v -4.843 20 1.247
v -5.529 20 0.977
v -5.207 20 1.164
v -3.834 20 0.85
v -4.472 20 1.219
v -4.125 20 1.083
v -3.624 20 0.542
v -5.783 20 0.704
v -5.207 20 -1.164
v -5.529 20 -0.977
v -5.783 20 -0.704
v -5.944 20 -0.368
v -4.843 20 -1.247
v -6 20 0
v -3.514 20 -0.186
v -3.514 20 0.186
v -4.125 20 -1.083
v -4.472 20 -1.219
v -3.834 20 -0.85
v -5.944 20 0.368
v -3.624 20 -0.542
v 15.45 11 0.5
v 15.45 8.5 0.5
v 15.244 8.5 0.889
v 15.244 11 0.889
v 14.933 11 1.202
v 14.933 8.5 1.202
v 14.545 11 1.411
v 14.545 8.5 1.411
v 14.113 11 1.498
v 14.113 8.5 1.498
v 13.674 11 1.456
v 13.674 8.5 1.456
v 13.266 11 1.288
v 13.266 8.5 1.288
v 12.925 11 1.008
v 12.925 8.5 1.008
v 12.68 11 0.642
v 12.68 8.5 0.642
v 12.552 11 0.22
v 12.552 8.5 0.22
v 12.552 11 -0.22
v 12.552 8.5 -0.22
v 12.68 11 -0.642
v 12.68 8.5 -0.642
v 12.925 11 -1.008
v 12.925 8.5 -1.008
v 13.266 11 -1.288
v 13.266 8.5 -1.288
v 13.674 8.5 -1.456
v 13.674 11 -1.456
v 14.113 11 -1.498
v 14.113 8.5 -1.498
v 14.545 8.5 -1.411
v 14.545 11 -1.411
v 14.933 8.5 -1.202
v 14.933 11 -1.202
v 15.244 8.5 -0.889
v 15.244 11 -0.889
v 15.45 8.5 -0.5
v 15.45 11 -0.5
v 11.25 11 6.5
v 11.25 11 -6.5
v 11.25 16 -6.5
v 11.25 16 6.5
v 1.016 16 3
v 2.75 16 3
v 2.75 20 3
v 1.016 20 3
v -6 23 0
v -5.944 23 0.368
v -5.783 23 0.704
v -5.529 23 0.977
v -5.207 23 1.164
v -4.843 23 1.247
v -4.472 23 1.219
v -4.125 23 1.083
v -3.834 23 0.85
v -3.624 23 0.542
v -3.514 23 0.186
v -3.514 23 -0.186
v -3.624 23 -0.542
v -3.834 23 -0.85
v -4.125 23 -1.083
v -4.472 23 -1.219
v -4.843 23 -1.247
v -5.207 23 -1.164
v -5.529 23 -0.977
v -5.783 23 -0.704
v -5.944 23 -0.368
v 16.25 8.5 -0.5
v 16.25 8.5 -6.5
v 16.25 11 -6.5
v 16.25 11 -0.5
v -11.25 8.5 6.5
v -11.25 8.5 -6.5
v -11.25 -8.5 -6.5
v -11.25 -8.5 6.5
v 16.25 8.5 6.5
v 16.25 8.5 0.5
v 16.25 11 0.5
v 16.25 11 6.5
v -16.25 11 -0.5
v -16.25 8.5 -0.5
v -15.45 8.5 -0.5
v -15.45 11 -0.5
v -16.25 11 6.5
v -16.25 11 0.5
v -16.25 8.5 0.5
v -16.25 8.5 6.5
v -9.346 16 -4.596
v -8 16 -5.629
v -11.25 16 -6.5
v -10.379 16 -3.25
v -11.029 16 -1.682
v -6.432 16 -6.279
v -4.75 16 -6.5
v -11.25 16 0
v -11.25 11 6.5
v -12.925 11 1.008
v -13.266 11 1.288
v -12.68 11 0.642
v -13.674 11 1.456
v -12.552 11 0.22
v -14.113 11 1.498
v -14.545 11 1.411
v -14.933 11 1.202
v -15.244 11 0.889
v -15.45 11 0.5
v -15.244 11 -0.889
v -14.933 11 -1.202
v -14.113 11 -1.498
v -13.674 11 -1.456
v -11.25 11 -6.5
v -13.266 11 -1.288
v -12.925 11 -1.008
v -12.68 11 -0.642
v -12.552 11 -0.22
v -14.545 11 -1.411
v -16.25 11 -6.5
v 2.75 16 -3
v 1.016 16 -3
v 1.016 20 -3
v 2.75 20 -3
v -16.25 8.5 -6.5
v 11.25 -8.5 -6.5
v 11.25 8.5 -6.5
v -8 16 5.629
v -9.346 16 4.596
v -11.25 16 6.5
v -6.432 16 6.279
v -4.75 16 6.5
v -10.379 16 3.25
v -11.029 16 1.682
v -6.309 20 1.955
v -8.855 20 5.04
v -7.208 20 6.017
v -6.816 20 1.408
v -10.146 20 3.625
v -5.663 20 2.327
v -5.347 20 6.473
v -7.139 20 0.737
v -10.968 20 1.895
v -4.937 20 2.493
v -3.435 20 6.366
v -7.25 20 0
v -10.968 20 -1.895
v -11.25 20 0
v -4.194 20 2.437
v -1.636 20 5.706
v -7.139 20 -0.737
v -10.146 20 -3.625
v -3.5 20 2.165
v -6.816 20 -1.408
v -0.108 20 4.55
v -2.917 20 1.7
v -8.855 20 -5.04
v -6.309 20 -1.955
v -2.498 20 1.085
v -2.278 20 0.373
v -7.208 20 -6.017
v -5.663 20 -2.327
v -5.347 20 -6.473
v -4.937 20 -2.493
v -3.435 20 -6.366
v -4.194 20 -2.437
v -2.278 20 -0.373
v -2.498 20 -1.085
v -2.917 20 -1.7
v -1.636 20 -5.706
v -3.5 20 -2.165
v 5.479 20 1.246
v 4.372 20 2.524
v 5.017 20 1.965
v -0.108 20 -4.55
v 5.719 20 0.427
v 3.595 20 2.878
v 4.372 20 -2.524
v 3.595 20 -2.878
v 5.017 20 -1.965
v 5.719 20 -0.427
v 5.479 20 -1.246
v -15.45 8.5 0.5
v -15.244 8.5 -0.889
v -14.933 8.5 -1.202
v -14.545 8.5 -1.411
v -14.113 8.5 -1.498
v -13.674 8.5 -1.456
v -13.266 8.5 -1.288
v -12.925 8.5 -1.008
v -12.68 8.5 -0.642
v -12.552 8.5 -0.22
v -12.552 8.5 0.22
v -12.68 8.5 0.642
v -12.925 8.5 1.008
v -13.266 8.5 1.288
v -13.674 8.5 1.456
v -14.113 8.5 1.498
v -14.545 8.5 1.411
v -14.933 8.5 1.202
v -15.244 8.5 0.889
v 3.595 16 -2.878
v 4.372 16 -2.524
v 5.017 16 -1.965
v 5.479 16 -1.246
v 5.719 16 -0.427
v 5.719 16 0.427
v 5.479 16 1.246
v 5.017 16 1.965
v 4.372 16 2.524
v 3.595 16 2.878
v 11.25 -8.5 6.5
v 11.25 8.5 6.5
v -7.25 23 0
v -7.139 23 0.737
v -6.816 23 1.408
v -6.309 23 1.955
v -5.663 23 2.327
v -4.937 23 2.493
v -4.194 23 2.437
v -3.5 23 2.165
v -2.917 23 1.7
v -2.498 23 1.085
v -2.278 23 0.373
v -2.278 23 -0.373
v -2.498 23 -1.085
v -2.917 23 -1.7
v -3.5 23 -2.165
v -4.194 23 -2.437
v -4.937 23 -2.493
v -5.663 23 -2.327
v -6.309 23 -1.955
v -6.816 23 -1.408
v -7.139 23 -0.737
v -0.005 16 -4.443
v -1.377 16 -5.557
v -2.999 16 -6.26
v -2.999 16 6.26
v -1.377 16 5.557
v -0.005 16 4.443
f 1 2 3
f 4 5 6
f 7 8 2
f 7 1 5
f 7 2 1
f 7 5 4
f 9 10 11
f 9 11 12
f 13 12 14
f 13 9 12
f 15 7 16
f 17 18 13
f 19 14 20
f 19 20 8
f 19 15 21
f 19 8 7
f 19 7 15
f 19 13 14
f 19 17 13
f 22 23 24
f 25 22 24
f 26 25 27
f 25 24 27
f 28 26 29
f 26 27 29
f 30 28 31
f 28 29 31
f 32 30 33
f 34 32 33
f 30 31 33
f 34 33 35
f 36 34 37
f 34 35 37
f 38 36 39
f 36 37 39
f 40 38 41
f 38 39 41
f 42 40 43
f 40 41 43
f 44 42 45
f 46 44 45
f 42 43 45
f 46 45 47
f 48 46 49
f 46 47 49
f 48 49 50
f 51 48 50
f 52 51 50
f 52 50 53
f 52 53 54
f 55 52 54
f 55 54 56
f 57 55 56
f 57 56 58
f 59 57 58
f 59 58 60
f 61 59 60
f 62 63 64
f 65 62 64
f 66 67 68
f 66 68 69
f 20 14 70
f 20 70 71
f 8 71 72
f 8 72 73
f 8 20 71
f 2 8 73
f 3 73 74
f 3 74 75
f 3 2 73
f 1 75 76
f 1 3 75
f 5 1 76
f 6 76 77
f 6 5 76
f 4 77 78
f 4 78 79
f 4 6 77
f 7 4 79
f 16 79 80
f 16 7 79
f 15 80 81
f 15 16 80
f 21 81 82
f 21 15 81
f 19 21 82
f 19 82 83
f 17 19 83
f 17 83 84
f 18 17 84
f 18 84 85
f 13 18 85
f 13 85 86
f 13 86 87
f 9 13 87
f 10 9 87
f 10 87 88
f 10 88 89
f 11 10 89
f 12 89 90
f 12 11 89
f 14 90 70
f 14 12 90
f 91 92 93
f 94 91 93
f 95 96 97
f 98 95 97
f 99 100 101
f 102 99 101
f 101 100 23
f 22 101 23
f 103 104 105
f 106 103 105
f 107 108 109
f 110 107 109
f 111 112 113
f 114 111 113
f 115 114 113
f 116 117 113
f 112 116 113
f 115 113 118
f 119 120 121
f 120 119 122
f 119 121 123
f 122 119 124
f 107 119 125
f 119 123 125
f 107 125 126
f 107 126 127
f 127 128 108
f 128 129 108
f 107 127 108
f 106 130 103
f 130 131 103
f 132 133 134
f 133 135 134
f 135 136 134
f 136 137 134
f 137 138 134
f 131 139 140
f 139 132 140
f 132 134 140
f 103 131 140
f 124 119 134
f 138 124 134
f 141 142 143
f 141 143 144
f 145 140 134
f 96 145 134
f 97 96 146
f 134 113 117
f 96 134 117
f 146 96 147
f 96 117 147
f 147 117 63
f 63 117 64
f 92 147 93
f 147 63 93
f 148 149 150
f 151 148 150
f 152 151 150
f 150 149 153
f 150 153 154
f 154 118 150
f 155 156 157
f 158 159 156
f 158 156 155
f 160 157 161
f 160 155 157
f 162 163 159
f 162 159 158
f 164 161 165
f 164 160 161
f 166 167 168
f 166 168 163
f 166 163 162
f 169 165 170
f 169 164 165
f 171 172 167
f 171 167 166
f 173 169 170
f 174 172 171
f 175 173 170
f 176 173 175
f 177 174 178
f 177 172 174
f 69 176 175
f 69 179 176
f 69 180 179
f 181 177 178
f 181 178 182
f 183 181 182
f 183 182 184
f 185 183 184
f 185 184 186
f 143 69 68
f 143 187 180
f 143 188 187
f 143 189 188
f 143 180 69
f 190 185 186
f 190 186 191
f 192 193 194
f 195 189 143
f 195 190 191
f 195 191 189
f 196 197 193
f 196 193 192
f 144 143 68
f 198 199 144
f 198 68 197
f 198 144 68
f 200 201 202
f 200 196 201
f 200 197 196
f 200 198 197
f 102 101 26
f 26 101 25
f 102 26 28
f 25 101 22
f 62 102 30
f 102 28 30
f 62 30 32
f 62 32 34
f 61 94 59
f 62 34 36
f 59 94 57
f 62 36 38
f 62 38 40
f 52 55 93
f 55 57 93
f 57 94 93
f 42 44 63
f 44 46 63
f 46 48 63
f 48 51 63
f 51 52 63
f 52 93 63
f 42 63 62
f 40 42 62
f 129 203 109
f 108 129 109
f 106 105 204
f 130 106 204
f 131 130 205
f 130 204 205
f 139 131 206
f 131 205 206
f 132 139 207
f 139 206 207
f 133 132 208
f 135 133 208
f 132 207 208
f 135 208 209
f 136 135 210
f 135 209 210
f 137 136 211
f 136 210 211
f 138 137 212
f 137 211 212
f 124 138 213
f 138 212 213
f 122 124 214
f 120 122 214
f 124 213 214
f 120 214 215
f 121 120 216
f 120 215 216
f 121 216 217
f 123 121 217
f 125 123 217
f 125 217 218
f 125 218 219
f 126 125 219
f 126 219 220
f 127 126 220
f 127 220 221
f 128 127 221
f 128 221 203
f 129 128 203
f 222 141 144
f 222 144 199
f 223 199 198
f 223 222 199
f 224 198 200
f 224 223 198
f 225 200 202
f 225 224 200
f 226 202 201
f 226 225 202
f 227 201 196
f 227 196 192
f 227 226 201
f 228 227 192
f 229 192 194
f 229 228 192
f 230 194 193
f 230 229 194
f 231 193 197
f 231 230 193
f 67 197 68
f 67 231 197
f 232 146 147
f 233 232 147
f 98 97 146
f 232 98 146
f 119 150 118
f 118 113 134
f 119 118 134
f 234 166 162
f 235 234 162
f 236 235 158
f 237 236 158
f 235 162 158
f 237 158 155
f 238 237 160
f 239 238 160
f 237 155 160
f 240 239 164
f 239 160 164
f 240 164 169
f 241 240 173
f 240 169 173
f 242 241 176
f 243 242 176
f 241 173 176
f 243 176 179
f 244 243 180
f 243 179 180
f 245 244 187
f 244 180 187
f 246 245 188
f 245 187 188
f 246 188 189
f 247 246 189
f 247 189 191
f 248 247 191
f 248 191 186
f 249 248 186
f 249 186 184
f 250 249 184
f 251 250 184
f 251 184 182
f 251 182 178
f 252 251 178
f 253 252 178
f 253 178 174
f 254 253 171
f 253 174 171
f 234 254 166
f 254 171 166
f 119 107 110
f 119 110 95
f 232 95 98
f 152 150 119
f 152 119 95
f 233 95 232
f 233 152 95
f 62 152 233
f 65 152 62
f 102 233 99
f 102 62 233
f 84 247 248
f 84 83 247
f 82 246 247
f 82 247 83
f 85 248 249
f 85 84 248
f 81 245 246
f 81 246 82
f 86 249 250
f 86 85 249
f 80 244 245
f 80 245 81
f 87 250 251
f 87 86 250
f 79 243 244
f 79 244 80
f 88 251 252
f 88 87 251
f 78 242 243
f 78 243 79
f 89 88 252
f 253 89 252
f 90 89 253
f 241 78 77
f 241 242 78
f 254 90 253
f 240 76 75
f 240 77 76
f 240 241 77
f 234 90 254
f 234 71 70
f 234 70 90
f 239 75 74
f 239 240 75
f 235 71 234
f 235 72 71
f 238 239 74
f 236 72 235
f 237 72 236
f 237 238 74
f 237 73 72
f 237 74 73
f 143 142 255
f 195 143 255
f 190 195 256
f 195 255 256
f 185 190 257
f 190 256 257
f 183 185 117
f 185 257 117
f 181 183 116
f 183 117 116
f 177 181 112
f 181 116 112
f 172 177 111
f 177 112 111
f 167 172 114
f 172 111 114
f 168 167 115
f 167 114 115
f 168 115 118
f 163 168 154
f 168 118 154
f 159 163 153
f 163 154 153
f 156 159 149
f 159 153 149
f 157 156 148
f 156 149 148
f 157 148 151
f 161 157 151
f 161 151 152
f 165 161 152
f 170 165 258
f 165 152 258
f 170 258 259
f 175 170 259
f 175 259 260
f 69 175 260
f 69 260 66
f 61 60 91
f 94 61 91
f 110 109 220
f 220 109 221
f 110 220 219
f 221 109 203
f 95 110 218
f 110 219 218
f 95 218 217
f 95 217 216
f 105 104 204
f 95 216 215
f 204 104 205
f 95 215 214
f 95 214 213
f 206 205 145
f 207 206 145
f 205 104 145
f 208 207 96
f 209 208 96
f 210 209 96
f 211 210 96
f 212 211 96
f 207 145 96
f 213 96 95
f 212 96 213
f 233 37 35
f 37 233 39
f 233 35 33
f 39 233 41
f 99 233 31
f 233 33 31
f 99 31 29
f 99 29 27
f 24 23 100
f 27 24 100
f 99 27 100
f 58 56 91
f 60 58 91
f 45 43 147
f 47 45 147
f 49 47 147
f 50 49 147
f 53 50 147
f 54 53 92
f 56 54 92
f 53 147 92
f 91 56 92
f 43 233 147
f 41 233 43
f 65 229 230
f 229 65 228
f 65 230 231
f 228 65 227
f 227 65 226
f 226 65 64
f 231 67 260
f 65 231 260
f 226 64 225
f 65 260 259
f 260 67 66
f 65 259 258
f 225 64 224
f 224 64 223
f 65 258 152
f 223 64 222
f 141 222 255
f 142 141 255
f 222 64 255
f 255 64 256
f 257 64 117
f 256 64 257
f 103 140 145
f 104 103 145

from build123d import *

# Parameters (mm, degrees)
BOSS_EXTRUDE1_DEPTH      = 6.5
BOSS_EXTRUDE1_DEPTH_BACK = 6.5
BOSS_EXTRUDE2_DEPTH      = 4
SKETCH4_R                = 2.5
SKETCH4_R_2              = 1.25
BOSS_EXTRUDE3_DEPTH      = 3
CUT_EXTRUDE1_DEPTH       = 29.901773302
CUT_EXTRUDE1_DEPTH_BACK  = 29.901773302


with BuildPart() as part:
    # Sketch1 → Boss-Extrude1 (new, two sides: drawn at the far end of the back side and taken through both)
    with BuildSketch(Plane.XY.offset(-BOSS_EXTRUDE1_DEPTH_BACK)):
        Polygon((-11.25, -8.5), (11.25, -8.5), (11.25, 8.5), (16.25, 8.5), (16.25, 11), (11.25, 11), (11.25, 16), (-11.25, 16), (-11.25, 11), (-16.25, 11), (-16.25, 8.5), (-11.25, 8.5), align=None)
    extrude(amount=BOSS_EXTRUDE1_DEPTH + BOSS_EXTRUDE1_DEPTH_BACK)

    # Sketch3 → Boss-Extrude2 (add)
    with BuildSketch(Plane(origin=(0, 16, 0), x_dir=(1, 0, 0), z_dir=(0, 1, 0))):
        with BuildLine():
            ThreePointArc((1.016281297, 3), (-11.25, 0), (1.016281297, -3))
            Line((1.016281297, -3), (2.75, -3))
            ThreePointArc((2.75, -3), (5.75, 0), (2.75, 3))
            Line((2.75, 3), (1.016281297, 3))
        make_face()
    extrude(amount=BOSS_EXTRUDE2_DEPTH)

    # Sketch4 → Boss-Extrude3 (add)
    with BuildSketch(Plane(origin=(0, 20, 0), x_dir=(1, 0, 0), z_dir=(0, 1, 0))):
        with Locations((-4.75, 0)):
            Circle(SKETCH4_R)
        with Locations((-4.75, 0)):
            Circle(SKETCH4_R_2, mode=Mode.SUBTRACT)
    extrude(amount=BOSS_EXTRUDE3_DEPTH)

    # Sketch5 → Cut-Extrude1 (cut, two sides: drawn at the far end of the back side and taken through both)
    with BuildSketch(Plane(origin=(0, 0, 0), x_dir=(1, 0, 0), z_dir=(0, 1, 0)).offset(-CUT_EXTRUDE1_DEPTH_BACK)):
        with BuildLine():
            Line((-16.25, 0.5), (-15.45, 0.5))
            ThreePointArc((-15.45, 0.5), (-12.535786438, 0), (-15.45, -0.5))
            Line((-15.45, -0.5), (-16.25, -0.5))
            Line((-16.25, -0.5), (-16.25, 0.5))
        make_face()
        with BuildLine():
            Line((16.25, -0.5), (15.45, -0.5))
            ThreePointArc((15.45, -0.5), (12.535786438, 0), (15.45, 0.5))
            Line((15.45, 0.5), (16.25, 0.5))
            Line((16.25, 0.5), (16.25, -0.5))
        make_face()
    extrude(amount=CUT_EXTRUDE1_DEPTH + CUT_EXTRUDE1_DEPTH_BACK, mode=Mode.SUBTRACT)


solid = part.part
